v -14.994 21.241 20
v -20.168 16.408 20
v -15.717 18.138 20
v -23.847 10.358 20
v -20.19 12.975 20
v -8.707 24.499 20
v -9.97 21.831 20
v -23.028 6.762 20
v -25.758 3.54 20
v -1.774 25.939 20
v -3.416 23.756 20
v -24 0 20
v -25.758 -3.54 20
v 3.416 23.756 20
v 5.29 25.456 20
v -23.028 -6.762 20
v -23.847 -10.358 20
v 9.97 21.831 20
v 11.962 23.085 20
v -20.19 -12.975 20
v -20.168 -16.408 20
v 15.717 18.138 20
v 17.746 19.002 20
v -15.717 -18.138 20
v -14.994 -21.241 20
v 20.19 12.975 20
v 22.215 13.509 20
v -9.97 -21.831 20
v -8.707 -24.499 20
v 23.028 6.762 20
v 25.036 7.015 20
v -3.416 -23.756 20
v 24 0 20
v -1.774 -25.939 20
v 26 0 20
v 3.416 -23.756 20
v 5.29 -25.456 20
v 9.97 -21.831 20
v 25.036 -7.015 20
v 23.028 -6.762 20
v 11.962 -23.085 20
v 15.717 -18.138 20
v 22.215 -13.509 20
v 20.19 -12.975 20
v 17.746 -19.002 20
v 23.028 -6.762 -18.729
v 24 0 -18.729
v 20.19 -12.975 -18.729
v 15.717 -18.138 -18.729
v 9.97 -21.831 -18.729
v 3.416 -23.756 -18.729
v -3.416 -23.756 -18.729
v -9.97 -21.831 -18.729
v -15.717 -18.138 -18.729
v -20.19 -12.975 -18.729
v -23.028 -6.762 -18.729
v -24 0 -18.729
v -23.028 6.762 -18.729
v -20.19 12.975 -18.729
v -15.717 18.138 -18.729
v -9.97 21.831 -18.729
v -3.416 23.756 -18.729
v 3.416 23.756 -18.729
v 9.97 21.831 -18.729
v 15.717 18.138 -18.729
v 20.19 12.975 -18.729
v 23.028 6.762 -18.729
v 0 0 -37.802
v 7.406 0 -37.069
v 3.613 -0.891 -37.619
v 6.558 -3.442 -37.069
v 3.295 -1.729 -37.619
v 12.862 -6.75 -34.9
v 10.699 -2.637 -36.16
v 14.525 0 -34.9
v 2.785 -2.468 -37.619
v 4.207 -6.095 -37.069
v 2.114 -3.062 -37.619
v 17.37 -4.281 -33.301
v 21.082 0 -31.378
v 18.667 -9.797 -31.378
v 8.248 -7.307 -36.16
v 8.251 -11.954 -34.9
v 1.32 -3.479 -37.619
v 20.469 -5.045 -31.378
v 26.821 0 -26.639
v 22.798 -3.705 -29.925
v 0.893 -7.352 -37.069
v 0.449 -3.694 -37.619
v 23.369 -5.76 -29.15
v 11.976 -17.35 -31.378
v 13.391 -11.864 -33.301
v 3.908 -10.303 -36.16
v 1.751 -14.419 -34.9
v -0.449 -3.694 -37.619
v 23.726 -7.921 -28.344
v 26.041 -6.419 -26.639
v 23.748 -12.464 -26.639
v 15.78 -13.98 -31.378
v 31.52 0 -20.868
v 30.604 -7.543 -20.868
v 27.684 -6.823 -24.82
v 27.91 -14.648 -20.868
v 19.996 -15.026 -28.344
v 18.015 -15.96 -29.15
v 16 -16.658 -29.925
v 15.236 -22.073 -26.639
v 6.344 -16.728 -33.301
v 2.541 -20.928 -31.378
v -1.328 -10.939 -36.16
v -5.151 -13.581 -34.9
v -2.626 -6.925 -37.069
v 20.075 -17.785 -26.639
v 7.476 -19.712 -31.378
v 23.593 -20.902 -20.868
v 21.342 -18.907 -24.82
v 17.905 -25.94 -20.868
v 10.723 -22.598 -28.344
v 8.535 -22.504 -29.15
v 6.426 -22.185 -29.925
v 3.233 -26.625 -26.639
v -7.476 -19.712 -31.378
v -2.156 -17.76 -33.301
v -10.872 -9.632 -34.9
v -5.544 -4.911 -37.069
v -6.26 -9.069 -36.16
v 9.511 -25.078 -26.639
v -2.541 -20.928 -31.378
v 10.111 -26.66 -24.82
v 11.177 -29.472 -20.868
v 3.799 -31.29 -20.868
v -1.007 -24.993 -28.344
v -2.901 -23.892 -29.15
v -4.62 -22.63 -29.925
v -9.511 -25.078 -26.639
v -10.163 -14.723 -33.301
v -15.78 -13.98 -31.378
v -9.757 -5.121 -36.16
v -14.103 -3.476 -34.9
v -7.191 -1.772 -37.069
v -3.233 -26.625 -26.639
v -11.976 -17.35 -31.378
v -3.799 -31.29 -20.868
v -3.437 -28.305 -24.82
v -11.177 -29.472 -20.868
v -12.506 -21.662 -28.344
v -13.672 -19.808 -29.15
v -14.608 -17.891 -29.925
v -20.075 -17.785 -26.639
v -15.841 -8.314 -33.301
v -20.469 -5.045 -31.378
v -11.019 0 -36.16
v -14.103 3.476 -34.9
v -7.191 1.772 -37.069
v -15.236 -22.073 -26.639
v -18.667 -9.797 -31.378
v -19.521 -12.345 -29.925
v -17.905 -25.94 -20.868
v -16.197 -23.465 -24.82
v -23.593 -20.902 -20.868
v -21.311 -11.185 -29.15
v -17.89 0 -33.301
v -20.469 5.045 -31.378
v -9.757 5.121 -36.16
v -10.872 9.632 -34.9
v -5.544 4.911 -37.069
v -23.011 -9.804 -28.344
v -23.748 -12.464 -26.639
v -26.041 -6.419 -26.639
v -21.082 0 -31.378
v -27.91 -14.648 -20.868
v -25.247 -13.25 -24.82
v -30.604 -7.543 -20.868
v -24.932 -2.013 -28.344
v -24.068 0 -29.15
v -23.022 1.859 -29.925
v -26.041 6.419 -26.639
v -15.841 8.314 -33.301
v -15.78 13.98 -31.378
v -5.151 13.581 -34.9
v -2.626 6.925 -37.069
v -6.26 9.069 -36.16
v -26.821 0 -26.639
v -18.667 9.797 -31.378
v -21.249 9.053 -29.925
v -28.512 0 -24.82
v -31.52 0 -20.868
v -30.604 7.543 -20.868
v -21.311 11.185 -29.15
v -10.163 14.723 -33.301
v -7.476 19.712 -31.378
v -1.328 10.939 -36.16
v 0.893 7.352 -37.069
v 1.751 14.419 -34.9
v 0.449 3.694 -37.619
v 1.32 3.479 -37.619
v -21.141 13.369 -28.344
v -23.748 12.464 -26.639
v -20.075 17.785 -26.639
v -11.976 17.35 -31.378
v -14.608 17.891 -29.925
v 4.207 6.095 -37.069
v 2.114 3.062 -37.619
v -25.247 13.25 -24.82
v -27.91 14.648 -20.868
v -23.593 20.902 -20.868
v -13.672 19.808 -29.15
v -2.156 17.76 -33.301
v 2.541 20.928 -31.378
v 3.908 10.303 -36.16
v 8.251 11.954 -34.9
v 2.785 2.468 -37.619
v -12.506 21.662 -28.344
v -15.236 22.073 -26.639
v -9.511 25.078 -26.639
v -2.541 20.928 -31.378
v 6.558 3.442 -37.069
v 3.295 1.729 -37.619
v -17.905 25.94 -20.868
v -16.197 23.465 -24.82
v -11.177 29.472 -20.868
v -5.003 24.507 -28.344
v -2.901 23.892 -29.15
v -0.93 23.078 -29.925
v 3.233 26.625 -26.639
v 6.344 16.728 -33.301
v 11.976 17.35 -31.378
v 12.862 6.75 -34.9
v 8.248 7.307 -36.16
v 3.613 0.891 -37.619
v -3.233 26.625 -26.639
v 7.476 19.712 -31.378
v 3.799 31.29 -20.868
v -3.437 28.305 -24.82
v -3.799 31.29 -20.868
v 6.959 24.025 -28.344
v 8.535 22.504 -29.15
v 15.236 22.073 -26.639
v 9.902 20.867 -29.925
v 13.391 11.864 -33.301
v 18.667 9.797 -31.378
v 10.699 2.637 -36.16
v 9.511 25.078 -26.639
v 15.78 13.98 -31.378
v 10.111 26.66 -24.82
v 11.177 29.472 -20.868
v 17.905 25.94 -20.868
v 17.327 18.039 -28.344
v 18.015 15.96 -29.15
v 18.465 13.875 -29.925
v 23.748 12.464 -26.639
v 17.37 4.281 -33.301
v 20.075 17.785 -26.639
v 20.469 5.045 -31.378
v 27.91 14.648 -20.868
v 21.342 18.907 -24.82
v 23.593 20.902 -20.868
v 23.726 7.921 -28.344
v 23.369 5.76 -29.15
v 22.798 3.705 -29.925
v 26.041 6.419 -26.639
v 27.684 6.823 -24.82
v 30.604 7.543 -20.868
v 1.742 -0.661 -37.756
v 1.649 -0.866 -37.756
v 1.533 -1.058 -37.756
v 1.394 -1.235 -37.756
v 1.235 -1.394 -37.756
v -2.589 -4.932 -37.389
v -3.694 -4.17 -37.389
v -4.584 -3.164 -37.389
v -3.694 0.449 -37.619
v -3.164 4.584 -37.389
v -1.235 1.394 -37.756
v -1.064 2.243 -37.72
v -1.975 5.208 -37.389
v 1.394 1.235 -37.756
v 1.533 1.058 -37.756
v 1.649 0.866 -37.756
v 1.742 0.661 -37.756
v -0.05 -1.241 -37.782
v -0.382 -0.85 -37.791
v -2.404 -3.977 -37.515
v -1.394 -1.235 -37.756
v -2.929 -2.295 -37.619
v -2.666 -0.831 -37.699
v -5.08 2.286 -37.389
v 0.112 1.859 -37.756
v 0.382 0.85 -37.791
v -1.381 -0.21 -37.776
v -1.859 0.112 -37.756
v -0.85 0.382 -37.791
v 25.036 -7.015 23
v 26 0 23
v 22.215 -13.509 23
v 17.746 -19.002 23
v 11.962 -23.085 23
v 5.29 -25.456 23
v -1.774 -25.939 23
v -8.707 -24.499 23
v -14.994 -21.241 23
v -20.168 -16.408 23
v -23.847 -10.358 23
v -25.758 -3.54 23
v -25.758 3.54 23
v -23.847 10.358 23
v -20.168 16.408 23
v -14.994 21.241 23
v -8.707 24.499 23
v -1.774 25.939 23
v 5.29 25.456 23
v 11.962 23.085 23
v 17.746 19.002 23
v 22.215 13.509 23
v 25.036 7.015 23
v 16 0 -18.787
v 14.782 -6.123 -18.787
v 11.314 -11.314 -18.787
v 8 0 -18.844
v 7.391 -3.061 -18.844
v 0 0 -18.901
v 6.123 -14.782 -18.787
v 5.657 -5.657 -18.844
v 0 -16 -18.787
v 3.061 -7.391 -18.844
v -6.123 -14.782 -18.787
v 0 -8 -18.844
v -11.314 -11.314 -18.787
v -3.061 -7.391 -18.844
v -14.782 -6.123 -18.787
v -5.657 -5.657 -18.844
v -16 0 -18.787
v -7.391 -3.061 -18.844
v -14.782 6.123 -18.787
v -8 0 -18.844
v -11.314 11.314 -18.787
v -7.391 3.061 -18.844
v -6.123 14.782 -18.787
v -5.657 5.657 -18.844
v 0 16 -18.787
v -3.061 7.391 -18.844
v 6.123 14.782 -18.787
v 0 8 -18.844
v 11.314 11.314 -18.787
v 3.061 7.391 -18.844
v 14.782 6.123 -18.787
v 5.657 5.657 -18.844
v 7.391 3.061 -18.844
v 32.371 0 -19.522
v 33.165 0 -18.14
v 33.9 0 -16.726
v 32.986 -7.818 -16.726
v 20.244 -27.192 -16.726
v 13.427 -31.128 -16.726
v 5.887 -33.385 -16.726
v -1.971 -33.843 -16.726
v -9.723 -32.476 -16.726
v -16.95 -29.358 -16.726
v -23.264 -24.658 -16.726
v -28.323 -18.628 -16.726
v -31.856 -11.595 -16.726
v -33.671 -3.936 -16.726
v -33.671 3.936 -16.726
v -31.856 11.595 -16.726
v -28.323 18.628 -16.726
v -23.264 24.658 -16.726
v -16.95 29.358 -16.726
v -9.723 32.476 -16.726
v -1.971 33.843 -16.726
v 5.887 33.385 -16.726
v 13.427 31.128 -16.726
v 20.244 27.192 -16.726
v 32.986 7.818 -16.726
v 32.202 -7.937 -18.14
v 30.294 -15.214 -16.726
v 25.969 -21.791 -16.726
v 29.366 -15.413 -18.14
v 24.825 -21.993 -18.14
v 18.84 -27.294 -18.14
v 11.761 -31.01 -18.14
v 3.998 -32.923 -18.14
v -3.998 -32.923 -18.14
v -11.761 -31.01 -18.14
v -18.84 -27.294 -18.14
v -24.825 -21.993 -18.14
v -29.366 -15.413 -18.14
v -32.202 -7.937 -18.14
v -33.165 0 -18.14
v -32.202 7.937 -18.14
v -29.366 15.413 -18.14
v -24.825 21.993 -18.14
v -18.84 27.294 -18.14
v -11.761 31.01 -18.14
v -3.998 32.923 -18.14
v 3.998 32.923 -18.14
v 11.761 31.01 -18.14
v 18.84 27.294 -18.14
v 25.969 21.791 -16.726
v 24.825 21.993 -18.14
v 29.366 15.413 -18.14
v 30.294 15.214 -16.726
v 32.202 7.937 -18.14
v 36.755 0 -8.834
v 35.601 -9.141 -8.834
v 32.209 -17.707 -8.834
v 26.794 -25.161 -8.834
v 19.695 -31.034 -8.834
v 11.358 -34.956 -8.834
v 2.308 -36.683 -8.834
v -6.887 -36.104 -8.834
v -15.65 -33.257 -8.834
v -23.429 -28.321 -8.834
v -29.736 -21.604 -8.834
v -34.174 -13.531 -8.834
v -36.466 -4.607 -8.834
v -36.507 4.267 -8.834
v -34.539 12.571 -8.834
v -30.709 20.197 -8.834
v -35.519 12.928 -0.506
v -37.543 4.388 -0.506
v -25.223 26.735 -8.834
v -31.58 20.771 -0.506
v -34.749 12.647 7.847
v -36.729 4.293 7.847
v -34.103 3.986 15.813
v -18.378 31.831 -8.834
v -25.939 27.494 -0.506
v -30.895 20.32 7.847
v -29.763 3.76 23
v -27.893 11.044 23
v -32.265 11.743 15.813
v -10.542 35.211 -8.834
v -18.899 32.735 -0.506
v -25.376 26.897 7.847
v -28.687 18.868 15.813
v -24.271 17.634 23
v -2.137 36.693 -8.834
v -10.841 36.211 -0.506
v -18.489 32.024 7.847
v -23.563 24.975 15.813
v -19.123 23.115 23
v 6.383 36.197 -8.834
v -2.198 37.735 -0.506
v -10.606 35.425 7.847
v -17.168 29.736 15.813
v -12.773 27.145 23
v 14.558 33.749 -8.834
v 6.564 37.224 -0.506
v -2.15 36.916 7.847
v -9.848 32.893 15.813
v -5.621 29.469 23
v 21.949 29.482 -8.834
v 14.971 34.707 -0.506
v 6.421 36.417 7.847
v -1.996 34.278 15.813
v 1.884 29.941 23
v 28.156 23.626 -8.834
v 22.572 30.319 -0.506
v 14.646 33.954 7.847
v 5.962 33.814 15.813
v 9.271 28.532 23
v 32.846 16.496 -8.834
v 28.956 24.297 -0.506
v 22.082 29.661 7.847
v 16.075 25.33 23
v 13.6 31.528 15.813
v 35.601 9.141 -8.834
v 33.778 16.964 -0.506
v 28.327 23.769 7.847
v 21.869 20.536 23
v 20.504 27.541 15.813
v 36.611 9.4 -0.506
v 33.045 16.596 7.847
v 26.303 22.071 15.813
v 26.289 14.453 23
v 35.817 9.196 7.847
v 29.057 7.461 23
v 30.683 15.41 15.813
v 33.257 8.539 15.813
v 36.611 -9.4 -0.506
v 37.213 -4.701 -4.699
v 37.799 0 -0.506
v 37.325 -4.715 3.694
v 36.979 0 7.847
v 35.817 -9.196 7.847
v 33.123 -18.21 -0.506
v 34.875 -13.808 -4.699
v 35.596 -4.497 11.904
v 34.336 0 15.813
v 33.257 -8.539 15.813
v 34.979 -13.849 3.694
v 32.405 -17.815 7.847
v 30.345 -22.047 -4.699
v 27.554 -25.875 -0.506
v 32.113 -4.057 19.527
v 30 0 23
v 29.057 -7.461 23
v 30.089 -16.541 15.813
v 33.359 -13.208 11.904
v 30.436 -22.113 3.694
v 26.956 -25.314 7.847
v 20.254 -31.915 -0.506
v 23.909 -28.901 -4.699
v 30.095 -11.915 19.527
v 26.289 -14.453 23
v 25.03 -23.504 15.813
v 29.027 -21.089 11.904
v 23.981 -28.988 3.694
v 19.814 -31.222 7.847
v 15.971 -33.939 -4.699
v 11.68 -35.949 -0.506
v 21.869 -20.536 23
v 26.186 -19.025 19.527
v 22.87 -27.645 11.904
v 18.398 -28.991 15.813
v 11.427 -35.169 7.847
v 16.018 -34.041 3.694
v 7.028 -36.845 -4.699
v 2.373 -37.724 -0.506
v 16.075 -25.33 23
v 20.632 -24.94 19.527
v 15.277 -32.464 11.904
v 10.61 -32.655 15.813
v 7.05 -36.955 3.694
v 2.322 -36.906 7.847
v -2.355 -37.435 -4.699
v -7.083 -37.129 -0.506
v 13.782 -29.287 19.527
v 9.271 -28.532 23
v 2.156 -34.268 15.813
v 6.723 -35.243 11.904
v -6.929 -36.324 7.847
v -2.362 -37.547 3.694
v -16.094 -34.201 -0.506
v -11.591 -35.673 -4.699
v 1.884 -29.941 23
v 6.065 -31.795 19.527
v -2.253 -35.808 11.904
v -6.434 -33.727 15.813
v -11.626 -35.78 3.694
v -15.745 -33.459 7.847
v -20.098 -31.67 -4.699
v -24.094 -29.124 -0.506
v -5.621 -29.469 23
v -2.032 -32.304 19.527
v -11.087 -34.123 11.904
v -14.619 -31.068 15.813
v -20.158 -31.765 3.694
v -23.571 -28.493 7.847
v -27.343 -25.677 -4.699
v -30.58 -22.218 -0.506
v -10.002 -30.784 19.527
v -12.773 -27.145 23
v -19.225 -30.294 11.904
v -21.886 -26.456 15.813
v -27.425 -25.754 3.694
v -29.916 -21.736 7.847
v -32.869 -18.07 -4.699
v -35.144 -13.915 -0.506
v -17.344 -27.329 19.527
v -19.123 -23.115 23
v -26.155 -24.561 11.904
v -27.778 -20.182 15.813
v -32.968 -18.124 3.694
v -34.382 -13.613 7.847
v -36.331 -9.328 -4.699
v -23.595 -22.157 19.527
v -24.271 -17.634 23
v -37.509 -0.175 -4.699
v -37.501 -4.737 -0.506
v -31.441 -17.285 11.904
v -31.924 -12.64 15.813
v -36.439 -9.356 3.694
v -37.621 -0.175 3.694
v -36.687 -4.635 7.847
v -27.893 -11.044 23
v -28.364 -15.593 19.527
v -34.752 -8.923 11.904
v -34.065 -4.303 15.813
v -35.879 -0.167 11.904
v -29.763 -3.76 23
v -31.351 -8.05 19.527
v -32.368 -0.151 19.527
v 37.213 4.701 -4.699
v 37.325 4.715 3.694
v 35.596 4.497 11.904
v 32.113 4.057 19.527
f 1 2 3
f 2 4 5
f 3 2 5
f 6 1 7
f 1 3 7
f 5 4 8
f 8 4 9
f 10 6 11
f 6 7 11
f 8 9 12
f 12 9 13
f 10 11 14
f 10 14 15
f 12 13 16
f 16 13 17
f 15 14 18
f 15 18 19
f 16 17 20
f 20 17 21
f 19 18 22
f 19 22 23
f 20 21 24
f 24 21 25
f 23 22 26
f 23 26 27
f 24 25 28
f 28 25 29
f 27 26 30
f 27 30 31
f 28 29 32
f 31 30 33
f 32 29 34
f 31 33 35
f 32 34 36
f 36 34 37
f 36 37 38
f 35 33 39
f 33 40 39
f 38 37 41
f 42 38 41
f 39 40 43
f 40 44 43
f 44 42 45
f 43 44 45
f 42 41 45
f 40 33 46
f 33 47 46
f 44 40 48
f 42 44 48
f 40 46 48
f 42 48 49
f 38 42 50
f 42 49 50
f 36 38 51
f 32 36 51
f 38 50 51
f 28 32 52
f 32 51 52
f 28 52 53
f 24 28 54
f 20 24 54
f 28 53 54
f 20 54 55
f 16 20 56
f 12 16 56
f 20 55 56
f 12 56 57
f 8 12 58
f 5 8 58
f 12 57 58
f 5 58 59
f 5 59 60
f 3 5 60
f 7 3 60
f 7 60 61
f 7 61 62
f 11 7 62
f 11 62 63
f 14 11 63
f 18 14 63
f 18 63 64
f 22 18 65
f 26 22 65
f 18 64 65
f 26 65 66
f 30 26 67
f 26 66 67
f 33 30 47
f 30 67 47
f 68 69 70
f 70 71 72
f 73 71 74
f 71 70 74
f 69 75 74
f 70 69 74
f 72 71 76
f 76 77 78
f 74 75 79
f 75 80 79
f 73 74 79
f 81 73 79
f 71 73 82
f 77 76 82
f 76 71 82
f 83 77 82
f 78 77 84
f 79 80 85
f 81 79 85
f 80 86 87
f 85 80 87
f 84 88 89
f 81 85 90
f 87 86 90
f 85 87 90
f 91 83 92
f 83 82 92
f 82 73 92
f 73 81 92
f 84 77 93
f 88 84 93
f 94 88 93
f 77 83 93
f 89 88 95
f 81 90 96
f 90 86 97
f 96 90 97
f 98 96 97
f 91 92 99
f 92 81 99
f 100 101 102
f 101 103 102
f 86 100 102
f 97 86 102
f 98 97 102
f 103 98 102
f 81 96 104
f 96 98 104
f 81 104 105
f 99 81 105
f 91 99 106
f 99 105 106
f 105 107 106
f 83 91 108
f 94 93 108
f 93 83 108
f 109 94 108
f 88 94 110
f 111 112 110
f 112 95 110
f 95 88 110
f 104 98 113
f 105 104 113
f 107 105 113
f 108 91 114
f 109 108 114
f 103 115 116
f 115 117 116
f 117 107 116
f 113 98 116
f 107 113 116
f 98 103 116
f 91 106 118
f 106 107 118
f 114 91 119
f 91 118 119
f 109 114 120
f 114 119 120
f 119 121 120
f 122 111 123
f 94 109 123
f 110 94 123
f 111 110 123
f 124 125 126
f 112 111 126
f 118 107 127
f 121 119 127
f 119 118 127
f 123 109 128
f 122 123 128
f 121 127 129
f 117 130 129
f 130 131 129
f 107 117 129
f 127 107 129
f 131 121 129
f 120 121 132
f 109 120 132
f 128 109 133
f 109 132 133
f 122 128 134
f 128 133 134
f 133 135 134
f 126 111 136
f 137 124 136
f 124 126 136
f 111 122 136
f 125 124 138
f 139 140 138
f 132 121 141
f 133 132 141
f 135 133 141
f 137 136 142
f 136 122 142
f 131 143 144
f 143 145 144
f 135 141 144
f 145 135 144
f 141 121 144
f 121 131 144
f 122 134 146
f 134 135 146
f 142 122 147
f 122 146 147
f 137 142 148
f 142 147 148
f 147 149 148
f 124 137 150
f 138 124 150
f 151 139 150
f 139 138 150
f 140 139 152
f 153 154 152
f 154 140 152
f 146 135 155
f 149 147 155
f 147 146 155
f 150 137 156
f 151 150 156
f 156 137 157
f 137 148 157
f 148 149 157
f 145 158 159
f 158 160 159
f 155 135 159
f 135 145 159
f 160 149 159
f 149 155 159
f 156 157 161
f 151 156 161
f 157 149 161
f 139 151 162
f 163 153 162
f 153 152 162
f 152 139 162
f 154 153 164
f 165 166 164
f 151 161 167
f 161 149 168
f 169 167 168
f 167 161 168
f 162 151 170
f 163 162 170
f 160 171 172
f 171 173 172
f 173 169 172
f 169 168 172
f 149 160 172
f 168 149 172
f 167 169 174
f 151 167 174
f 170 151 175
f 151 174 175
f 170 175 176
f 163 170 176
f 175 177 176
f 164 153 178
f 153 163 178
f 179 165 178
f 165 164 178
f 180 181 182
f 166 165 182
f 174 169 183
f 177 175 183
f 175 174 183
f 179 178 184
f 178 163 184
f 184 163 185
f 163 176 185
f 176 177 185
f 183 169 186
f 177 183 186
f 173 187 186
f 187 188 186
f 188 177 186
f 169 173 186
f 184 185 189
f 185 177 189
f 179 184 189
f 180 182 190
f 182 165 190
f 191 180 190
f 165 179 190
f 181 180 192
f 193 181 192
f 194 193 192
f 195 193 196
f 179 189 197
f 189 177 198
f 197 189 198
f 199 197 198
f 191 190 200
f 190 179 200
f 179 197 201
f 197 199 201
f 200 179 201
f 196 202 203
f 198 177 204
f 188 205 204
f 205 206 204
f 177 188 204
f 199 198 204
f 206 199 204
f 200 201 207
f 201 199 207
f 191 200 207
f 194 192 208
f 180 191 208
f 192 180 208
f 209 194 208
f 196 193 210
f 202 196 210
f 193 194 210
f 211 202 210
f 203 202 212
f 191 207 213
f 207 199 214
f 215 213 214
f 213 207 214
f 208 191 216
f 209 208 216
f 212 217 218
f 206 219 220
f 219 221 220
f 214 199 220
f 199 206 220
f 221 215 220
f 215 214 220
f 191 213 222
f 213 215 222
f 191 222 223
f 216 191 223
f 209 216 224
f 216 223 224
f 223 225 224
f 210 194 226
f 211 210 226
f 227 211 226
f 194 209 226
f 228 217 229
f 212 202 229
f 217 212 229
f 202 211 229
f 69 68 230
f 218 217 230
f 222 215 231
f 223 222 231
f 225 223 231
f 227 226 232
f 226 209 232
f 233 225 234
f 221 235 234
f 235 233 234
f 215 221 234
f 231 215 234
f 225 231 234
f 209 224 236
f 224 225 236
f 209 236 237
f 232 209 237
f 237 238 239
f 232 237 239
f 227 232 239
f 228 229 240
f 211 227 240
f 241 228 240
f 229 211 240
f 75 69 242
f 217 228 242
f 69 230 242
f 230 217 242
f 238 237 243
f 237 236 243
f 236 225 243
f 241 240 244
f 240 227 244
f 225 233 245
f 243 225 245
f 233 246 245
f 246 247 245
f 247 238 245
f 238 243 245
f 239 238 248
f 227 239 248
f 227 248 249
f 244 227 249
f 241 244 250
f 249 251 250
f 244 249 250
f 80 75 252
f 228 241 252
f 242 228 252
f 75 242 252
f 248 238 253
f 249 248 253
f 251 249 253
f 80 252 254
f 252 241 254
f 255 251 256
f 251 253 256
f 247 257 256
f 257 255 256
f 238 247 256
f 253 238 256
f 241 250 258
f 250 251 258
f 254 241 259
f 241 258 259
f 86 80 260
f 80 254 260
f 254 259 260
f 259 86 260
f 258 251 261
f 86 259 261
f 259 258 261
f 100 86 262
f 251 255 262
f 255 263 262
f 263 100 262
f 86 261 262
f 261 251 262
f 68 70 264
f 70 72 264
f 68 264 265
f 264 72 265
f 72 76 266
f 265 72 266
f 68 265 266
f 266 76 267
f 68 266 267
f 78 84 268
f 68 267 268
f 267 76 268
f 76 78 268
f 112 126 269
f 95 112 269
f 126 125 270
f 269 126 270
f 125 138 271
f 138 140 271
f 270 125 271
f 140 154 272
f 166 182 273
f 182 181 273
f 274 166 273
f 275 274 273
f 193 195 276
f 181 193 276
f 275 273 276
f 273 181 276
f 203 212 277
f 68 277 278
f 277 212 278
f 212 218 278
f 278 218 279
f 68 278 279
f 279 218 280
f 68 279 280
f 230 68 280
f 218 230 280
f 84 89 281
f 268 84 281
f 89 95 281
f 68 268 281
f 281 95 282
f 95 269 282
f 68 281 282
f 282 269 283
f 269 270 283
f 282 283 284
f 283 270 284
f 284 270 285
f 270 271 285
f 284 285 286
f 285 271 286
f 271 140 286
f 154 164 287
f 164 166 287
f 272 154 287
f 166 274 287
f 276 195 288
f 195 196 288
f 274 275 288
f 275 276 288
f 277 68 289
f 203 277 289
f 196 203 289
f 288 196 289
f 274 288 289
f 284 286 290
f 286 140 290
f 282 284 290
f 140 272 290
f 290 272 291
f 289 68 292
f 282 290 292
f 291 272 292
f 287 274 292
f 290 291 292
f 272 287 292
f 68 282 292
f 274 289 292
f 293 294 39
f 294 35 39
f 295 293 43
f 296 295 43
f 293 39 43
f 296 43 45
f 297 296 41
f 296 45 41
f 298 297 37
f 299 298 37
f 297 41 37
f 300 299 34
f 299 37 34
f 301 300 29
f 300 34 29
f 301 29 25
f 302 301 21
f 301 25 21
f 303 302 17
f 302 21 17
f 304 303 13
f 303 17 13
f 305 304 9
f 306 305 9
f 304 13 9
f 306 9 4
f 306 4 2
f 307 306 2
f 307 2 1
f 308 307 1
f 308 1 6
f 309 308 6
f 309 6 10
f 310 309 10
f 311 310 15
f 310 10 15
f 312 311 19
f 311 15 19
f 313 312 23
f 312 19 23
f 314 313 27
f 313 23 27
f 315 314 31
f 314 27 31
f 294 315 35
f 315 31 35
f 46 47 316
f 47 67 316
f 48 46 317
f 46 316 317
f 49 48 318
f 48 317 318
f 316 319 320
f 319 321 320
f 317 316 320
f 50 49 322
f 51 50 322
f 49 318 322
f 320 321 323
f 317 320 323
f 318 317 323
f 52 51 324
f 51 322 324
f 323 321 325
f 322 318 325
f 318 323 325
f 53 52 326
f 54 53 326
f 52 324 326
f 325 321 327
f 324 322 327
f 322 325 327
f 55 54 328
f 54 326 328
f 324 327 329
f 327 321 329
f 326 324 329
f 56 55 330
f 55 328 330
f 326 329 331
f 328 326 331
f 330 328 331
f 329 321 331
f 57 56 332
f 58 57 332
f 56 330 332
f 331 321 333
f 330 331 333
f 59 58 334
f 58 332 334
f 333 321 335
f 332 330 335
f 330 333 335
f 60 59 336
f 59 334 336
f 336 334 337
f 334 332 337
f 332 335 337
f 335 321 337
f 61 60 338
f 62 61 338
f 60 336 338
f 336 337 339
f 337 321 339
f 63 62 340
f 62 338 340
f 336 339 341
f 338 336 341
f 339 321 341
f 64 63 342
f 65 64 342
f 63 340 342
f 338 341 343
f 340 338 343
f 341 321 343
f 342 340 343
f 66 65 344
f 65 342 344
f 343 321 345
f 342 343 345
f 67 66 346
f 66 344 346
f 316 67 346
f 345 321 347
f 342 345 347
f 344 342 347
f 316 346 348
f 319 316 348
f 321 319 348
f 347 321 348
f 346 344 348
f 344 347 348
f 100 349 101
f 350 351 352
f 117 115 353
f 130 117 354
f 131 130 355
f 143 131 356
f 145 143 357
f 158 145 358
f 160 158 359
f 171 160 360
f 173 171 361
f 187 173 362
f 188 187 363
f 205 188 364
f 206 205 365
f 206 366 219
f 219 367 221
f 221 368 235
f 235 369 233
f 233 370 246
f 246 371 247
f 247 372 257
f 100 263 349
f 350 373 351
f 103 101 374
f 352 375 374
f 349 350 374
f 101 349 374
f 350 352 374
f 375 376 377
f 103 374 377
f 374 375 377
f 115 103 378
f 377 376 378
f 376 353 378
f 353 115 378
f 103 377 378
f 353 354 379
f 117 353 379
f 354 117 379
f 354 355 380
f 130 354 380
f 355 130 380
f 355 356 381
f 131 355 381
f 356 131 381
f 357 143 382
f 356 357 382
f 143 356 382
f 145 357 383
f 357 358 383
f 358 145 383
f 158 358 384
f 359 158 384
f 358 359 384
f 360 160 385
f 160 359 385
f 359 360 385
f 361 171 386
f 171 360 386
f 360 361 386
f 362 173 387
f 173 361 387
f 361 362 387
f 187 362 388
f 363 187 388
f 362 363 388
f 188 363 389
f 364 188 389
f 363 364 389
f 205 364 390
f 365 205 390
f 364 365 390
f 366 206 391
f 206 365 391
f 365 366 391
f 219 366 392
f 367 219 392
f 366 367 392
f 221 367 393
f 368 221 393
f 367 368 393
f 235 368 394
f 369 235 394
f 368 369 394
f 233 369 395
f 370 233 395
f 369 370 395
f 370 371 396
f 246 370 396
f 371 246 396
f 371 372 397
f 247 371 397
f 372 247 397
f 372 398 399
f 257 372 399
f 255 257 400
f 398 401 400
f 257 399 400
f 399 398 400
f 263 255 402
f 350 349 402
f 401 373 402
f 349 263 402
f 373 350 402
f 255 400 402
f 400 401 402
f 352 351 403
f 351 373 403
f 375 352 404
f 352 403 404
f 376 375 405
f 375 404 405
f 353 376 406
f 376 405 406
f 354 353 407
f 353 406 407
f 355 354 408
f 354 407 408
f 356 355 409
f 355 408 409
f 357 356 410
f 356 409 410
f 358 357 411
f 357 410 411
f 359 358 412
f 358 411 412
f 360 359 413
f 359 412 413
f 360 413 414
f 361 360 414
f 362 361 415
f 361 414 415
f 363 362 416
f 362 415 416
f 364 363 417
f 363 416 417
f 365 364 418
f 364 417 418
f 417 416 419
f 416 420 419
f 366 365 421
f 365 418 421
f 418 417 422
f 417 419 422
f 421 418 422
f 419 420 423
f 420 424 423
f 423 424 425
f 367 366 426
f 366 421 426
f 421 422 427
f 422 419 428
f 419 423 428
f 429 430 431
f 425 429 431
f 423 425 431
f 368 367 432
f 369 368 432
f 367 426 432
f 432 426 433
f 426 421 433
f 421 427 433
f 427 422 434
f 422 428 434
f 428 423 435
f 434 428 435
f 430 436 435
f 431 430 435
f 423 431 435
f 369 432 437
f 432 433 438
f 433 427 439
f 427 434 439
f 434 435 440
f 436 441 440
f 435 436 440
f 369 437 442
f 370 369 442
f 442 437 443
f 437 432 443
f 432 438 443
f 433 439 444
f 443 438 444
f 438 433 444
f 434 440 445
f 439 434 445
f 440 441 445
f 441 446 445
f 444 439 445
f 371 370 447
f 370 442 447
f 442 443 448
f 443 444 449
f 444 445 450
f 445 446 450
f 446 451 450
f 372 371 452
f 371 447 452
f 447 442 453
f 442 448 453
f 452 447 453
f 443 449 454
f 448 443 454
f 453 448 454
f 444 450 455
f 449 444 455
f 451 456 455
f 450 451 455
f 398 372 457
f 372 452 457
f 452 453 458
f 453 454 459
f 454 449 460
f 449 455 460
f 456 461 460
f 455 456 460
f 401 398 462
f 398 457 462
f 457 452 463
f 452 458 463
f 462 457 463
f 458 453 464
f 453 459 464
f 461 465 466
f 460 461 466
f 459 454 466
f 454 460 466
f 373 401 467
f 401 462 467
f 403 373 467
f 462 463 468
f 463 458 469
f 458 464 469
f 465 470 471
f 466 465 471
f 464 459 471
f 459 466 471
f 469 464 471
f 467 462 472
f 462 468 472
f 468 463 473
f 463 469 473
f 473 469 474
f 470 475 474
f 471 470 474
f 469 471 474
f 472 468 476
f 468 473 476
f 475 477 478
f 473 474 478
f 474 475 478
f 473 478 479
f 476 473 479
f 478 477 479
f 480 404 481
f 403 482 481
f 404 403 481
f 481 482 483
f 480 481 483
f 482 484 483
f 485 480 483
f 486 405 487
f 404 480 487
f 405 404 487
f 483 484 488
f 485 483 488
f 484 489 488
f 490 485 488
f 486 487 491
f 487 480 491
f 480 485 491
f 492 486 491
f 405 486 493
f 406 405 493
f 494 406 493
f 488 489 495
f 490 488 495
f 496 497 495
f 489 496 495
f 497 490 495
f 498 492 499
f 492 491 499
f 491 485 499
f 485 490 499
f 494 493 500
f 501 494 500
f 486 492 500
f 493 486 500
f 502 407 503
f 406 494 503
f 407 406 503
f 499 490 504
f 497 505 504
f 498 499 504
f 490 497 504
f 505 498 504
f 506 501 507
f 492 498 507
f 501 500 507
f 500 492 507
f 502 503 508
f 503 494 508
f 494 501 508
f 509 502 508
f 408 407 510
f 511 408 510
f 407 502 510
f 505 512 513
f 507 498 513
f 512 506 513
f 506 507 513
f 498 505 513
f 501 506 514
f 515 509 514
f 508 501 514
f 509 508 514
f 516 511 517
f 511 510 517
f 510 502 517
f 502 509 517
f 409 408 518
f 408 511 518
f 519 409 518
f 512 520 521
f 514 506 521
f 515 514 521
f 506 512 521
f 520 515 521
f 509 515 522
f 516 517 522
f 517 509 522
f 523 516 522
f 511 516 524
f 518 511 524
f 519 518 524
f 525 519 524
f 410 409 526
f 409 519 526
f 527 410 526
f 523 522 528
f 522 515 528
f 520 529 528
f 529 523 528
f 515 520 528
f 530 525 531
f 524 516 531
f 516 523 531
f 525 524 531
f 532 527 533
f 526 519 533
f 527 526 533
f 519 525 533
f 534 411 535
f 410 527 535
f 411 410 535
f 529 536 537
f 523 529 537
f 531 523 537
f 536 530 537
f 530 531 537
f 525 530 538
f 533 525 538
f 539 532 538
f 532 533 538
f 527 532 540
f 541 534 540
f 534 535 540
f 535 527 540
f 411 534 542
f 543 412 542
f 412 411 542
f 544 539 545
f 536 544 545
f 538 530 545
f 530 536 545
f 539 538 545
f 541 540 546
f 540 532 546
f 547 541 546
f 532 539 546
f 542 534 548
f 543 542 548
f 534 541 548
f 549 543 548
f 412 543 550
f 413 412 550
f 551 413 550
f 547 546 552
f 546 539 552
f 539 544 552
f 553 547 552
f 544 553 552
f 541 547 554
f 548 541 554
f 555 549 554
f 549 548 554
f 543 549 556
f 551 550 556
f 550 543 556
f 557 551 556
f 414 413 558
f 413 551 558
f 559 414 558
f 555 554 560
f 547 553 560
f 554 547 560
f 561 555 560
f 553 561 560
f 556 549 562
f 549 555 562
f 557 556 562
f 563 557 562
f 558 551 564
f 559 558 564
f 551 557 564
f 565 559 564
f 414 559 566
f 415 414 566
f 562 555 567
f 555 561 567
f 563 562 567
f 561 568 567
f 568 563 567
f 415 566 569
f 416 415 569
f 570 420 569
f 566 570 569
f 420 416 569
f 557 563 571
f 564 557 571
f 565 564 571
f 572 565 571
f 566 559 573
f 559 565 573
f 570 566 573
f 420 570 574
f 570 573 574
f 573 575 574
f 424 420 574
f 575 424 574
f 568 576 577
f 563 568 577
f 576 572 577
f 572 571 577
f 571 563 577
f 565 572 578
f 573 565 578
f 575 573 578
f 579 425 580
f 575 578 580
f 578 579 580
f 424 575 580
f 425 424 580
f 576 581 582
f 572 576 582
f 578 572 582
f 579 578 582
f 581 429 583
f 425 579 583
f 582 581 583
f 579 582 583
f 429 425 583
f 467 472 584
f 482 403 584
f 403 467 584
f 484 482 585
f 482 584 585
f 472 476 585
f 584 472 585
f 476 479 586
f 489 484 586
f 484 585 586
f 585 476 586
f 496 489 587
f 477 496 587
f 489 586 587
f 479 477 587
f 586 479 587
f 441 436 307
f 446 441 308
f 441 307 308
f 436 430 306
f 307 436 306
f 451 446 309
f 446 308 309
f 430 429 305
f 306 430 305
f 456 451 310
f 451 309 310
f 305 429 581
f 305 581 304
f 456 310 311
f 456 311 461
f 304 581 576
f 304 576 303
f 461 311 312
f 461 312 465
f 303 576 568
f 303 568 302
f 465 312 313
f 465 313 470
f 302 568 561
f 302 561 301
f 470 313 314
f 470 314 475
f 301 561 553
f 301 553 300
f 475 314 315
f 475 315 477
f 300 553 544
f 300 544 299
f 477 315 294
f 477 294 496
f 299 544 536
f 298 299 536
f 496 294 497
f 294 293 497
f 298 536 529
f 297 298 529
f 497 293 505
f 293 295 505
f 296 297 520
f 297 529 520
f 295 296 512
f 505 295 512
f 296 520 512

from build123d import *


with BuildPart() as f1:
    # F0 (on Front) → F1 (revolve)
    with BuildSketch(Plane.XZ):
        with BuildLine():
            Line((30, 23), (26, 23))
            Line((26, 23), (26, 20))
            Line((26, 20), (24, 20))
            Line((24, 20), (24, -11.03716))
            Line((24, -11.03716), (24, -16.546911))
            Line((24, -16.546911), (24, -18.729299))
            Line((24, -18.729299), (0, -18.901058))
            Line((0, -18.901058), (0, -37.802116))
            ThreePointArc((0, -37.802116), (17.890361, -33.300675), (31.519987, -20.868408))
            ThreePointArc((31.519987, -20.868408), (32.775592, -18.835089), (33.900211, -16.726496))
            ThreePointArc((33.900211, -16.726496), (37.621242, 3.693525), (30, 23))
        make_face()
    revolve(axis=Axis((0, 0, 35.521735), (0, 0, -1)))


solid = f1.part
